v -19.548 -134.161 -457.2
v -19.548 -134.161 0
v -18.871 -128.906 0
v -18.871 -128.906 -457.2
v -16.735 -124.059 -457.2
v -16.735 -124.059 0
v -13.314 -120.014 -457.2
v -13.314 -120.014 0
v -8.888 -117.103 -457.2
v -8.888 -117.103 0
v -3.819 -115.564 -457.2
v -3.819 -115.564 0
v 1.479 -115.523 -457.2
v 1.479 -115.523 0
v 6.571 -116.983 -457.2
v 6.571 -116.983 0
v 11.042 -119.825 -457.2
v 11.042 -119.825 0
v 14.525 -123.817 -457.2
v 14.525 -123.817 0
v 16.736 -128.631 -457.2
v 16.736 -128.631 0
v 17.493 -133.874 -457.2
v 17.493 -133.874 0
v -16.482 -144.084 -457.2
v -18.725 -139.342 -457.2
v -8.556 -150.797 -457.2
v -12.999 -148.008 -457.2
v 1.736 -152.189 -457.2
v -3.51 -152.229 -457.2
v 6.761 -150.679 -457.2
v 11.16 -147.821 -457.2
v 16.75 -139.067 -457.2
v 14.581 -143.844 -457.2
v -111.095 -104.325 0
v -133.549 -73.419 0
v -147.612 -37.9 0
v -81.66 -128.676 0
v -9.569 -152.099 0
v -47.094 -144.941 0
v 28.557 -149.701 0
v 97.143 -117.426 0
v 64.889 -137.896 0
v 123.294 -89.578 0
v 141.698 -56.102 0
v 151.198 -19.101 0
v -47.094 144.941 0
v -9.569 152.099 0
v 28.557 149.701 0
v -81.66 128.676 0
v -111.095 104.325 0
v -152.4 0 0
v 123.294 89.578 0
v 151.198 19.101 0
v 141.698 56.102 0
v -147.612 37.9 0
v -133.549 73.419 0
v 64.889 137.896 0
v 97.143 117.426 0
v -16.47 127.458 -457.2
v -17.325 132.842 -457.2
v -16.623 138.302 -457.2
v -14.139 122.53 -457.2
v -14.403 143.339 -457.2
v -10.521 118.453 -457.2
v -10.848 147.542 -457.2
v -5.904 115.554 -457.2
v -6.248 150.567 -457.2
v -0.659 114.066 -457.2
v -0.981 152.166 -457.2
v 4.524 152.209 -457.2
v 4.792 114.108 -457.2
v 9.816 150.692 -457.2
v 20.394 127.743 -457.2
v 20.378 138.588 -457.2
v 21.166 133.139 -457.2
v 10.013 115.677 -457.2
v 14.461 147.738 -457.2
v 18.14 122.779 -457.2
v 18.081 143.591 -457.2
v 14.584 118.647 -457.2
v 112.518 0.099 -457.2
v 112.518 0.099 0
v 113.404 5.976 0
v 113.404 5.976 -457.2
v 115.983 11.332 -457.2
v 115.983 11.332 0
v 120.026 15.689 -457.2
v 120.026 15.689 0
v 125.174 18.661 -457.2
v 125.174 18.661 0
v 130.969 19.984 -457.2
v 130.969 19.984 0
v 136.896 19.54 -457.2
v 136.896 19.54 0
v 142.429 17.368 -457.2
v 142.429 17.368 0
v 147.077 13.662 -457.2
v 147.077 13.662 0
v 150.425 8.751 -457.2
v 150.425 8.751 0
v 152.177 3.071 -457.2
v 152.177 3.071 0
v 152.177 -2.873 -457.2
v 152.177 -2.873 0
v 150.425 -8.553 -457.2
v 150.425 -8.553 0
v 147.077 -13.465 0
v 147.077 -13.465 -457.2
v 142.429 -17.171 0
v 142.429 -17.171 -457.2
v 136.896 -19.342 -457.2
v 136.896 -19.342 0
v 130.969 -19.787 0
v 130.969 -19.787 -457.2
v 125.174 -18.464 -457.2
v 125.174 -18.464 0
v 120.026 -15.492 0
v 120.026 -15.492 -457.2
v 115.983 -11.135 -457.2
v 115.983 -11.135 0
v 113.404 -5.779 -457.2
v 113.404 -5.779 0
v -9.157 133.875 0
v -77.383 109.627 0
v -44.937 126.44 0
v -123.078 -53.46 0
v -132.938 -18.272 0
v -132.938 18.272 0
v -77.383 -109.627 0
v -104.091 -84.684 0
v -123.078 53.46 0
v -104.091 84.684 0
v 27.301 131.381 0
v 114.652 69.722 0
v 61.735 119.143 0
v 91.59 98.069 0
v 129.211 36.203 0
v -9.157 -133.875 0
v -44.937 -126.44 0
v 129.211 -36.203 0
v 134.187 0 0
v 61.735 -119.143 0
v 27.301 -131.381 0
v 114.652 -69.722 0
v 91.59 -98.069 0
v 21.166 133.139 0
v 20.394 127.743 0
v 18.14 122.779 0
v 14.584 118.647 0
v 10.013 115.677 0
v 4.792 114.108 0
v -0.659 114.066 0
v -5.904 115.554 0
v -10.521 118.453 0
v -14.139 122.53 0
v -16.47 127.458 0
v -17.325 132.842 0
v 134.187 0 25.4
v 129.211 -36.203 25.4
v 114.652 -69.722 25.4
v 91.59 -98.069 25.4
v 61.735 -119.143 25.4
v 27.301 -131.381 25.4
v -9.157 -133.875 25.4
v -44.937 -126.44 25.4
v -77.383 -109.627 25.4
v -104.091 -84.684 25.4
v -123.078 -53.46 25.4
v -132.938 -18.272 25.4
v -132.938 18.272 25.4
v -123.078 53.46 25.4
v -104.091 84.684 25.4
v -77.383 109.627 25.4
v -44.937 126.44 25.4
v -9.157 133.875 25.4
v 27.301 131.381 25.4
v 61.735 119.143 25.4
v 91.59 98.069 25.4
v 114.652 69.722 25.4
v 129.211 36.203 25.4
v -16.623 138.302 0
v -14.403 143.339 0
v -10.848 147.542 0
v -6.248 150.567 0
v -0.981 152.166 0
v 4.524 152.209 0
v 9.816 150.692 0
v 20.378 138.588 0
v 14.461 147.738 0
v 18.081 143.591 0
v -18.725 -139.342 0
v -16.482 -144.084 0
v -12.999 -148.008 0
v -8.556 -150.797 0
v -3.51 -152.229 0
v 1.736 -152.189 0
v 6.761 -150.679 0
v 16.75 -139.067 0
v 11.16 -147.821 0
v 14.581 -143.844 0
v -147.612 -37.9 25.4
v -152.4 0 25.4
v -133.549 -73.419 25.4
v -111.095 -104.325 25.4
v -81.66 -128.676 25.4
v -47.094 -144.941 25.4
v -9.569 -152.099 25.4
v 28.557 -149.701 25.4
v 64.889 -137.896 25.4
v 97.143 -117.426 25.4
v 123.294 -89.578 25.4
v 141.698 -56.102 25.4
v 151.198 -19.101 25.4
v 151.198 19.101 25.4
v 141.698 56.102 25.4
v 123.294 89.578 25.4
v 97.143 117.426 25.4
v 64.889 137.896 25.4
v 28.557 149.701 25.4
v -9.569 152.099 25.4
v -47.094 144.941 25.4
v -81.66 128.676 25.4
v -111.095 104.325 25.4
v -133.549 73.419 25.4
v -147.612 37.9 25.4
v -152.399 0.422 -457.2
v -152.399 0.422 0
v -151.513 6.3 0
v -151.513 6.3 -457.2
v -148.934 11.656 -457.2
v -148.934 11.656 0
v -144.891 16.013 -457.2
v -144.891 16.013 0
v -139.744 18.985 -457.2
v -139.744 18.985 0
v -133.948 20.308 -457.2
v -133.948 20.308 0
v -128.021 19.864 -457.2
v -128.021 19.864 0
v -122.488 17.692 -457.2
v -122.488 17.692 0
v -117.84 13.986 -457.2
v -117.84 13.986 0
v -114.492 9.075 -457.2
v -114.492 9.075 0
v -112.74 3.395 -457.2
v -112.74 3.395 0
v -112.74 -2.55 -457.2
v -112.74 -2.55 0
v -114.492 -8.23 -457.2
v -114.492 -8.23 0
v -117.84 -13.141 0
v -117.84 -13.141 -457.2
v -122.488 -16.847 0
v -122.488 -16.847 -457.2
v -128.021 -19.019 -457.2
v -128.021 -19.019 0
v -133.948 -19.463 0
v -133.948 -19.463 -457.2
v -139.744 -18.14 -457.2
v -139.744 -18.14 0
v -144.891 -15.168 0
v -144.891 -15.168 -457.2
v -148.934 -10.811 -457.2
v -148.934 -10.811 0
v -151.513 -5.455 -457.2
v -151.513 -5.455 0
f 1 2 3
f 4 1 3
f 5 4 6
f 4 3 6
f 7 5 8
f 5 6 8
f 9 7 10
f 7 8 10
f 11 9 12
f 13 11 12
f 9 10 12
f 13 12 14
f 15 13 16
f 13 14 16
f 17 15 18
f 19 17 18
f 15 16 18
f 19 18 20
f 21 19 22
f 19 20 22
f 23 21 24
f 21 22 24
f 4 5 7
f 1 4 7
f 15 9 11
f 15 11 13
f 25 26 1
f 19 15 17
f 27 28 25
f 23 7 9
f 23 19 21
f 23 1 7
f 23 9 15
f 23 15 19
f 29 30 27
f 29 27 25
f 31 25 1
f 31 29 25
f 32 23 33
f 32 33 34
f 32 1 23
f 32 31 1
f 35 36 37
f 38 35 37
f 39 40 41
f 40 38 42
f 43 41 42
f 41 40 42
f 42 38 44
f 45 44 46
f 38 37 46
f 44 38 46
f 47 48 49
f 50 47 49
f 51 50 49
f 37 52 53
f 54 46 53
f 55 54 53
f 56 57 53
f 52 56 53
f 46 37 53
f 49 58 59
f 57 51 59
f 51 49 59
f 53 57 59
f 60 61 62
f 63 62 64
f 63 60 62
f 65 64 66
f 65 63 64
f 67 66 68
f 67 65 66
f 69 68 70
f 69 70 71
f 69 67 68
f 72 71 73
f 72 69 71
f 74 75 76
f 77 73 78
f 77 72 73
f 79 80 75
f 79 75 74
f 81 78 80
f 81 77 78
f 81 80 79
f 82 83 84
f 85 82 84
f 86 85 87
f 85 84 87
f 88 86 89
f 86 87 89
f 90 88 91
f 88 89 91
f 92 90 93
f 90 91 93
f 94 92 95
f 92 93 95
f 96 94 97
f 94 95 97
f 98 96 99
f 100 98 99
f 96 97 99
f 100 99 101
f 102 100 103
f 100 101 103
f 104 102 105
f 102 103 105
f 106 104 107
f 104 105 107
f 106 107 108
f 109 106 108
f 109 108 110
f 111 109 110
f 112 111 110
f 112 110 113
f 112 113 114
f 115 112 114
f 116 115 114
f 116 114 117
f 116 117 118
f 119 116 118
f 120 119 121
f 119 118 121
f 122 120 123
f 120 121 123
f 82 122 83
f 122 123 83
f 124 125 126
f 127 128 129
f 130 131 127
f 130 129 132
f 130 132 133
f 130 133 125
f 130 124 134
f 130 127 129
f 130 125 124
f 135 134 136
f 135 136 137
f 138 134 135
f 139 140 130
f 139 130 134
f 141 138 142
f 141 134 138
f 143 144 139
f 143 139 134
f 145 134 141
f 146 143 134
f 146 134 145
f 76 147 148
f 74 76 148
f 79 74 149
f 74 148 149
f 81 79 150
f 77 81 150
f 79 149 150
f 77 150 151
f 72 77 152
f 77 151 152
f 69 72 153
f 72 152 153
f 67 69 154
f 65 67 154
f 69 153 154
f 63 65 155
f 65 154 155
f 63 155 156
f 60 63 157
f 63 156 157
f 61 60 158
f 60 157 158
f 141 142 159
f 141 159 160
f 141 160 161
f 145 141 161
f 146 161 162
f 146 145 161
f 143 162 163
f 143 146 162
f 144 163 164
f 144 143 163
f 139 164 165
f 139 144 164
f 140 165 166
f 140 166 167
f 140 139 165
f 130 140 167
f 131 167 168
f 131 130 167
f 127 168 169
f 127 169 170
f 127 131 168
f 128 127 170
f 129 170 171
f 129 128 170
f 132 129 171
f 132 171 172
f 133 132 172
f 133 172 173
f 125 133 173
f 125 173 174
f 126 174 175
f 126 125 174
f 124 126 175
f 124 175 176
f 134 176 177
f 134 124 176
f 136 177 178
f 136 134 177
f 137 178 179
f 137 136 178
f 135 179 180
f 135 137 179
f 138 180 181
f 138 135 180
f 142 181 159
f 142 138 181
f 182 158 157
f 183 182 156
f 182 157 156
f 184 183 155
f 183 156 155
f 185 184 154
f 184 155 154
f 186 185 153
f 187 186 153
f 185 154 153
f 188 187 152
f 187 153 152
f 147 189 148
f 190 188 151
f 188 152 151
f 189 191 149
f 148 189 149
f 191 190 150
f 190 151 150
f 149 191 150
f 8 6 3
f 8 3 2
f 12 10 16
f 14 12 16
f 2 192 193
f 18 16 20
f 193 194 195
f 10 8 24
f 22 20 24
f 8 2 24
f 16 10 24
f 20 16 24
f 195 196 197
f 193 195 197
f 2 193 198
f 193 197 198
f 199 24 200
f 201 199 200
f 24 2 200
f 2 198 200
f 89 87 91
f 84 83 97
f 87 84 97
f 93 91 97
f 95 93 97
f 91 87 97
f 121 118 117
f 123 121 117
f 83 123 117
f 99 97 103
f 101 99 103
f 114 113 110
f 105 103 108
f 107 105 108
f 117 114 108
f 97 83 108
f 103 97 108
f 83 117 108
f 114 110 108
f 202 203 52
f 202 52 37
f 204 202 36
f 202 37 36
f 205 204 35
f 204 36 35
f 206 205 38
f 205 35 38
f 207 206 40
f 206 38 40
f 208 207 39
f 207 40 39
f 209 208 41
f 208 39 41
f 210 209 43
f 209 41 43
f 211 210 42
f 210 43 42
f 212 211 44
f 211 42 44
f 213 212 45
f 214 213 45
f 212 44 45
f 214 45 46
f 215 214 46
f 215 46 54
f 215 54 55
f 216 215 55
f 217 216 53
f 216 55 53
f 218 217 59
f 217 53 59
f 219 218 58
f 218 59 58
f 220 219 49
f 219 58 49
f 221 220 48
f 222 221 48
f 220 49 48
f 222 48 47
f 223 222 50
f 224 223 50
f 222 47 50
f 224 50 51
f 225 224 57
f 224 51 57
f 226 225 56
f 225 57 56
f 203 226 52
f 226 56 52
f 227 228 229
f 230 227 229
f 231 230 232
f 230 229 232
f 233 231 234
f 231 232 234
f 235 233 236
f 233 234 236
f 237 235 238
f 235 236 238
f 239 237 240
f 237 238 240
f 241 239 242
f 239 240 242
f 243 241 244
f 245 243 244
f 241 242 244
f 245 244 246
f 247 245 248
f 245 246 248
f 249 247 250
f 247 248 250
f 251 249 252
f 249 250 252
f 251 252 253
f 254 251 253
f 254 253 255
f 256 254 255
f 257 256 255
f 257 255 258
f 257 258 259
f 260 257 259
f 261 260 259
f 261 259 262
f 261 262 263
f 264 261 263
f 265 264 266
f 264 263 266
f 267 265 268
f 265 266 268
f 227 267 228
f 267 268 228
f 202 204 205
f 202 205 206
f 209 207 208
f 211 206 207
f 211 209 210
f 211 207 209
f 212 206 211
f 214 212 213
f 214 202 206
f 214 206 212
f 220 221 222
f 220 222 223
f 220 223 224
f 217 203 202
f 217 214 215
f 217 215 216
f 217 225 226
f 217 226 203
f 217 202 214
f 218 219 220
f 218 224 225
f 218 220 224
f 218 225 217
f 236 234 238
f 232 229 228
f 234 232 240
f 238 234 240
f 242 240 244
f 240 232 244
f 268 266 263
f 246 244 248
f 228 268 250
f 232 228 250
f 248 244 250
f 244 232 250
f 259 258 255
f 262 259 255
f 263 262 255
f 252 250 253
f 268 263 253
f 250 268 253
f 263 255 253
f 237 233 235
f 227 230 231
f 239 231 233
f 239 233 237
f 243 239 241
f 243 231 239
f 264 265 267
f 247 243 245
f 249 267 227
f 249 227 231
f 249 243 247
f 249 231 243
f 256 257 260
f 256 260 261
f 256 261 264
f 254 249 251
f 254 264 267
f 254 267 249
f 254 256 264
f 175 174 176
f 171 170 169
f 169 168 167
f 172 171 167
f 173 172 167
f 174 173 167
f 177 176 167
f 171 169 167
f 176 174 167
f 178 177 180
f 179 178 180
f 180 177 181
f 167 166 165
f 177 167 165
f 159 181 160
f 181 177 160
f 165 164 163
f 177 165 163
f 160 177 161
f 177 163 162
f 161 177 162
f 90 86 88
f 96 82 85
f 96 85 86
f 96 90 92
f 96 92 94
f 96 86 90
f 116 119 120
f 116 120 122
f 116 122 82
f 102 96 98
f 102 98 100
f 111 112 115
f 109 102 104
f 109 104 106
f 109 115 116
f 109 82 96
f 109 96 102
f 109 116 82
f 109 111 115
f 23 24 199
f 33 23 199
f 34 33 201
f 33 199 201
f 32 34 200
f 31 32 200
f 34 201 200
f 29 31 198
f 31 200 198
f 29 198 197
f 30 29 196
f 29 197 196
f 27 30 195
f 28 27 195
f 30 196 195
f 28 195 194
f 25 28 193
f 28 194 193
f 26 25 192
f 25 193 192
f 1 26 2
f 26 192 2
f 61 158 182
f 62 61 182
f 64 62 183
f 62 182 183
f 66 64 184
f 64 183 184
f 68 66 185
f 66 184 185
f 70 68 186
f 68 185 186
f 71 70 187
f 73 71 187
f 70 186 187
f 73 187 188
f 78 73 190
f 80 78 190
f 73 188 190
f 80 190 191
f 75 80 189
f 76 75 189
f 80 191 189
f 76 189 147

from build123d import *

# Parameters (mm, degrees)
F1_DEPTH = 25.4
F3_DEPTH = 457.2
F4_R     = 134.187483
F5_DEPTH = 25.4


with BuildPart() as f1:
    # F0 (on Top) → F1 (new body)
    with BuildSketch(Plane.XY):
        with BuildLine():
            Line((-152.4, 0), (152.4, 0))
            ThreePointArc((152.4, 0), (0, 152.4), (-152.4, 0))
        make_face()
        with BuildLine():
            ThreePointArc((-152.4, 0), (0, -152.4), (152.4, 0))
            Line((152.4, 0), (-152.4, 0))
        make_face()
    extrude(amount=F1_DEPTH)


with BuildPart() as f3:
    # F2 (on face) → F3 (new body)
    with BuildSketch(Plane(origin=(0, 0, 0), x_dir=(1, 0, 0), z_dir=(0, 0, -1))):
        with BuildLine():
            Line((-17.325427, -132.841849), (21.165663, -133.139476))
            ThreePointArc((21.165663, -133.139476), (2.067785, -113.893356), (-17.325427, -132.841849))
        make_face()
        with BuildLine():
            ThreePointArc((-17.325427, -132.841849), (1.770149, -152.385596), (21.165663, -133.139476))
            Line((21.165663, -133.139476), (-17.325427, -132.841849))
        make_face()
        with BuildLine():
            Line((-19.547921, 134.160678), (17.493443, 133.874261))
            ThreePointArc((17.493443, 133.874261), (-0.885134, 152.395497), (-19.547921, 134.160678))
        make_face()
        with BuildLine():
            ThreePointArc((-19.547921, 134.160678), (-1.171559, 115.353025), (17.493443, 133.874261))
            Line((17.493443, 133.874261), (-19.547921, 134.160678))
        make_face()
        with BuildLine():
            Line((112.517726, -0.098693), (152.399963, -0.098693))
            ThreePointArc((152.399963, -0.098693), (132.458845, 19.842426), (112.517726, -0.098693))
        make_face()
        with BuildLine():
            ThreePointArc((112.517726, -0.098693), (132.458845, -20.039811), (152.399963, -0.098693))
            Line((152.399963, -0.098693), (112.517726, -0.098693))
        make_face()
        with BuildLine():
            Line((-152.399326, -0.422475), (-112.517089, -0.422475))
            ThreePointArc((-112.517089, -0.422475), (-132.458208, 19.518644), (-152.399326, -0.422475))
        make_face()
        with BuildLine():
            ThreePointArc((-152.399326, -0.422475), (-132.458208, -20.363593), (-112.517089, -0.422475))
            Line((-112.517089, -0.422475), (-152.399326, -0.422475))
        make_face()
    extrude(amount=F3_DEPTH)


with BuildPart() as f5:
    # F4 (on face) → F5 (new body)
    with BuildSketch(Plane(origin=(0, 0, 0), x_dir=(1, 0, 0), z_dir=(0, 0, -1))):
        Circle(F4_R)
    extrude(amount=-F5_DEPTH)


solid = Compound([f1.part, f3.part, f5.part])
